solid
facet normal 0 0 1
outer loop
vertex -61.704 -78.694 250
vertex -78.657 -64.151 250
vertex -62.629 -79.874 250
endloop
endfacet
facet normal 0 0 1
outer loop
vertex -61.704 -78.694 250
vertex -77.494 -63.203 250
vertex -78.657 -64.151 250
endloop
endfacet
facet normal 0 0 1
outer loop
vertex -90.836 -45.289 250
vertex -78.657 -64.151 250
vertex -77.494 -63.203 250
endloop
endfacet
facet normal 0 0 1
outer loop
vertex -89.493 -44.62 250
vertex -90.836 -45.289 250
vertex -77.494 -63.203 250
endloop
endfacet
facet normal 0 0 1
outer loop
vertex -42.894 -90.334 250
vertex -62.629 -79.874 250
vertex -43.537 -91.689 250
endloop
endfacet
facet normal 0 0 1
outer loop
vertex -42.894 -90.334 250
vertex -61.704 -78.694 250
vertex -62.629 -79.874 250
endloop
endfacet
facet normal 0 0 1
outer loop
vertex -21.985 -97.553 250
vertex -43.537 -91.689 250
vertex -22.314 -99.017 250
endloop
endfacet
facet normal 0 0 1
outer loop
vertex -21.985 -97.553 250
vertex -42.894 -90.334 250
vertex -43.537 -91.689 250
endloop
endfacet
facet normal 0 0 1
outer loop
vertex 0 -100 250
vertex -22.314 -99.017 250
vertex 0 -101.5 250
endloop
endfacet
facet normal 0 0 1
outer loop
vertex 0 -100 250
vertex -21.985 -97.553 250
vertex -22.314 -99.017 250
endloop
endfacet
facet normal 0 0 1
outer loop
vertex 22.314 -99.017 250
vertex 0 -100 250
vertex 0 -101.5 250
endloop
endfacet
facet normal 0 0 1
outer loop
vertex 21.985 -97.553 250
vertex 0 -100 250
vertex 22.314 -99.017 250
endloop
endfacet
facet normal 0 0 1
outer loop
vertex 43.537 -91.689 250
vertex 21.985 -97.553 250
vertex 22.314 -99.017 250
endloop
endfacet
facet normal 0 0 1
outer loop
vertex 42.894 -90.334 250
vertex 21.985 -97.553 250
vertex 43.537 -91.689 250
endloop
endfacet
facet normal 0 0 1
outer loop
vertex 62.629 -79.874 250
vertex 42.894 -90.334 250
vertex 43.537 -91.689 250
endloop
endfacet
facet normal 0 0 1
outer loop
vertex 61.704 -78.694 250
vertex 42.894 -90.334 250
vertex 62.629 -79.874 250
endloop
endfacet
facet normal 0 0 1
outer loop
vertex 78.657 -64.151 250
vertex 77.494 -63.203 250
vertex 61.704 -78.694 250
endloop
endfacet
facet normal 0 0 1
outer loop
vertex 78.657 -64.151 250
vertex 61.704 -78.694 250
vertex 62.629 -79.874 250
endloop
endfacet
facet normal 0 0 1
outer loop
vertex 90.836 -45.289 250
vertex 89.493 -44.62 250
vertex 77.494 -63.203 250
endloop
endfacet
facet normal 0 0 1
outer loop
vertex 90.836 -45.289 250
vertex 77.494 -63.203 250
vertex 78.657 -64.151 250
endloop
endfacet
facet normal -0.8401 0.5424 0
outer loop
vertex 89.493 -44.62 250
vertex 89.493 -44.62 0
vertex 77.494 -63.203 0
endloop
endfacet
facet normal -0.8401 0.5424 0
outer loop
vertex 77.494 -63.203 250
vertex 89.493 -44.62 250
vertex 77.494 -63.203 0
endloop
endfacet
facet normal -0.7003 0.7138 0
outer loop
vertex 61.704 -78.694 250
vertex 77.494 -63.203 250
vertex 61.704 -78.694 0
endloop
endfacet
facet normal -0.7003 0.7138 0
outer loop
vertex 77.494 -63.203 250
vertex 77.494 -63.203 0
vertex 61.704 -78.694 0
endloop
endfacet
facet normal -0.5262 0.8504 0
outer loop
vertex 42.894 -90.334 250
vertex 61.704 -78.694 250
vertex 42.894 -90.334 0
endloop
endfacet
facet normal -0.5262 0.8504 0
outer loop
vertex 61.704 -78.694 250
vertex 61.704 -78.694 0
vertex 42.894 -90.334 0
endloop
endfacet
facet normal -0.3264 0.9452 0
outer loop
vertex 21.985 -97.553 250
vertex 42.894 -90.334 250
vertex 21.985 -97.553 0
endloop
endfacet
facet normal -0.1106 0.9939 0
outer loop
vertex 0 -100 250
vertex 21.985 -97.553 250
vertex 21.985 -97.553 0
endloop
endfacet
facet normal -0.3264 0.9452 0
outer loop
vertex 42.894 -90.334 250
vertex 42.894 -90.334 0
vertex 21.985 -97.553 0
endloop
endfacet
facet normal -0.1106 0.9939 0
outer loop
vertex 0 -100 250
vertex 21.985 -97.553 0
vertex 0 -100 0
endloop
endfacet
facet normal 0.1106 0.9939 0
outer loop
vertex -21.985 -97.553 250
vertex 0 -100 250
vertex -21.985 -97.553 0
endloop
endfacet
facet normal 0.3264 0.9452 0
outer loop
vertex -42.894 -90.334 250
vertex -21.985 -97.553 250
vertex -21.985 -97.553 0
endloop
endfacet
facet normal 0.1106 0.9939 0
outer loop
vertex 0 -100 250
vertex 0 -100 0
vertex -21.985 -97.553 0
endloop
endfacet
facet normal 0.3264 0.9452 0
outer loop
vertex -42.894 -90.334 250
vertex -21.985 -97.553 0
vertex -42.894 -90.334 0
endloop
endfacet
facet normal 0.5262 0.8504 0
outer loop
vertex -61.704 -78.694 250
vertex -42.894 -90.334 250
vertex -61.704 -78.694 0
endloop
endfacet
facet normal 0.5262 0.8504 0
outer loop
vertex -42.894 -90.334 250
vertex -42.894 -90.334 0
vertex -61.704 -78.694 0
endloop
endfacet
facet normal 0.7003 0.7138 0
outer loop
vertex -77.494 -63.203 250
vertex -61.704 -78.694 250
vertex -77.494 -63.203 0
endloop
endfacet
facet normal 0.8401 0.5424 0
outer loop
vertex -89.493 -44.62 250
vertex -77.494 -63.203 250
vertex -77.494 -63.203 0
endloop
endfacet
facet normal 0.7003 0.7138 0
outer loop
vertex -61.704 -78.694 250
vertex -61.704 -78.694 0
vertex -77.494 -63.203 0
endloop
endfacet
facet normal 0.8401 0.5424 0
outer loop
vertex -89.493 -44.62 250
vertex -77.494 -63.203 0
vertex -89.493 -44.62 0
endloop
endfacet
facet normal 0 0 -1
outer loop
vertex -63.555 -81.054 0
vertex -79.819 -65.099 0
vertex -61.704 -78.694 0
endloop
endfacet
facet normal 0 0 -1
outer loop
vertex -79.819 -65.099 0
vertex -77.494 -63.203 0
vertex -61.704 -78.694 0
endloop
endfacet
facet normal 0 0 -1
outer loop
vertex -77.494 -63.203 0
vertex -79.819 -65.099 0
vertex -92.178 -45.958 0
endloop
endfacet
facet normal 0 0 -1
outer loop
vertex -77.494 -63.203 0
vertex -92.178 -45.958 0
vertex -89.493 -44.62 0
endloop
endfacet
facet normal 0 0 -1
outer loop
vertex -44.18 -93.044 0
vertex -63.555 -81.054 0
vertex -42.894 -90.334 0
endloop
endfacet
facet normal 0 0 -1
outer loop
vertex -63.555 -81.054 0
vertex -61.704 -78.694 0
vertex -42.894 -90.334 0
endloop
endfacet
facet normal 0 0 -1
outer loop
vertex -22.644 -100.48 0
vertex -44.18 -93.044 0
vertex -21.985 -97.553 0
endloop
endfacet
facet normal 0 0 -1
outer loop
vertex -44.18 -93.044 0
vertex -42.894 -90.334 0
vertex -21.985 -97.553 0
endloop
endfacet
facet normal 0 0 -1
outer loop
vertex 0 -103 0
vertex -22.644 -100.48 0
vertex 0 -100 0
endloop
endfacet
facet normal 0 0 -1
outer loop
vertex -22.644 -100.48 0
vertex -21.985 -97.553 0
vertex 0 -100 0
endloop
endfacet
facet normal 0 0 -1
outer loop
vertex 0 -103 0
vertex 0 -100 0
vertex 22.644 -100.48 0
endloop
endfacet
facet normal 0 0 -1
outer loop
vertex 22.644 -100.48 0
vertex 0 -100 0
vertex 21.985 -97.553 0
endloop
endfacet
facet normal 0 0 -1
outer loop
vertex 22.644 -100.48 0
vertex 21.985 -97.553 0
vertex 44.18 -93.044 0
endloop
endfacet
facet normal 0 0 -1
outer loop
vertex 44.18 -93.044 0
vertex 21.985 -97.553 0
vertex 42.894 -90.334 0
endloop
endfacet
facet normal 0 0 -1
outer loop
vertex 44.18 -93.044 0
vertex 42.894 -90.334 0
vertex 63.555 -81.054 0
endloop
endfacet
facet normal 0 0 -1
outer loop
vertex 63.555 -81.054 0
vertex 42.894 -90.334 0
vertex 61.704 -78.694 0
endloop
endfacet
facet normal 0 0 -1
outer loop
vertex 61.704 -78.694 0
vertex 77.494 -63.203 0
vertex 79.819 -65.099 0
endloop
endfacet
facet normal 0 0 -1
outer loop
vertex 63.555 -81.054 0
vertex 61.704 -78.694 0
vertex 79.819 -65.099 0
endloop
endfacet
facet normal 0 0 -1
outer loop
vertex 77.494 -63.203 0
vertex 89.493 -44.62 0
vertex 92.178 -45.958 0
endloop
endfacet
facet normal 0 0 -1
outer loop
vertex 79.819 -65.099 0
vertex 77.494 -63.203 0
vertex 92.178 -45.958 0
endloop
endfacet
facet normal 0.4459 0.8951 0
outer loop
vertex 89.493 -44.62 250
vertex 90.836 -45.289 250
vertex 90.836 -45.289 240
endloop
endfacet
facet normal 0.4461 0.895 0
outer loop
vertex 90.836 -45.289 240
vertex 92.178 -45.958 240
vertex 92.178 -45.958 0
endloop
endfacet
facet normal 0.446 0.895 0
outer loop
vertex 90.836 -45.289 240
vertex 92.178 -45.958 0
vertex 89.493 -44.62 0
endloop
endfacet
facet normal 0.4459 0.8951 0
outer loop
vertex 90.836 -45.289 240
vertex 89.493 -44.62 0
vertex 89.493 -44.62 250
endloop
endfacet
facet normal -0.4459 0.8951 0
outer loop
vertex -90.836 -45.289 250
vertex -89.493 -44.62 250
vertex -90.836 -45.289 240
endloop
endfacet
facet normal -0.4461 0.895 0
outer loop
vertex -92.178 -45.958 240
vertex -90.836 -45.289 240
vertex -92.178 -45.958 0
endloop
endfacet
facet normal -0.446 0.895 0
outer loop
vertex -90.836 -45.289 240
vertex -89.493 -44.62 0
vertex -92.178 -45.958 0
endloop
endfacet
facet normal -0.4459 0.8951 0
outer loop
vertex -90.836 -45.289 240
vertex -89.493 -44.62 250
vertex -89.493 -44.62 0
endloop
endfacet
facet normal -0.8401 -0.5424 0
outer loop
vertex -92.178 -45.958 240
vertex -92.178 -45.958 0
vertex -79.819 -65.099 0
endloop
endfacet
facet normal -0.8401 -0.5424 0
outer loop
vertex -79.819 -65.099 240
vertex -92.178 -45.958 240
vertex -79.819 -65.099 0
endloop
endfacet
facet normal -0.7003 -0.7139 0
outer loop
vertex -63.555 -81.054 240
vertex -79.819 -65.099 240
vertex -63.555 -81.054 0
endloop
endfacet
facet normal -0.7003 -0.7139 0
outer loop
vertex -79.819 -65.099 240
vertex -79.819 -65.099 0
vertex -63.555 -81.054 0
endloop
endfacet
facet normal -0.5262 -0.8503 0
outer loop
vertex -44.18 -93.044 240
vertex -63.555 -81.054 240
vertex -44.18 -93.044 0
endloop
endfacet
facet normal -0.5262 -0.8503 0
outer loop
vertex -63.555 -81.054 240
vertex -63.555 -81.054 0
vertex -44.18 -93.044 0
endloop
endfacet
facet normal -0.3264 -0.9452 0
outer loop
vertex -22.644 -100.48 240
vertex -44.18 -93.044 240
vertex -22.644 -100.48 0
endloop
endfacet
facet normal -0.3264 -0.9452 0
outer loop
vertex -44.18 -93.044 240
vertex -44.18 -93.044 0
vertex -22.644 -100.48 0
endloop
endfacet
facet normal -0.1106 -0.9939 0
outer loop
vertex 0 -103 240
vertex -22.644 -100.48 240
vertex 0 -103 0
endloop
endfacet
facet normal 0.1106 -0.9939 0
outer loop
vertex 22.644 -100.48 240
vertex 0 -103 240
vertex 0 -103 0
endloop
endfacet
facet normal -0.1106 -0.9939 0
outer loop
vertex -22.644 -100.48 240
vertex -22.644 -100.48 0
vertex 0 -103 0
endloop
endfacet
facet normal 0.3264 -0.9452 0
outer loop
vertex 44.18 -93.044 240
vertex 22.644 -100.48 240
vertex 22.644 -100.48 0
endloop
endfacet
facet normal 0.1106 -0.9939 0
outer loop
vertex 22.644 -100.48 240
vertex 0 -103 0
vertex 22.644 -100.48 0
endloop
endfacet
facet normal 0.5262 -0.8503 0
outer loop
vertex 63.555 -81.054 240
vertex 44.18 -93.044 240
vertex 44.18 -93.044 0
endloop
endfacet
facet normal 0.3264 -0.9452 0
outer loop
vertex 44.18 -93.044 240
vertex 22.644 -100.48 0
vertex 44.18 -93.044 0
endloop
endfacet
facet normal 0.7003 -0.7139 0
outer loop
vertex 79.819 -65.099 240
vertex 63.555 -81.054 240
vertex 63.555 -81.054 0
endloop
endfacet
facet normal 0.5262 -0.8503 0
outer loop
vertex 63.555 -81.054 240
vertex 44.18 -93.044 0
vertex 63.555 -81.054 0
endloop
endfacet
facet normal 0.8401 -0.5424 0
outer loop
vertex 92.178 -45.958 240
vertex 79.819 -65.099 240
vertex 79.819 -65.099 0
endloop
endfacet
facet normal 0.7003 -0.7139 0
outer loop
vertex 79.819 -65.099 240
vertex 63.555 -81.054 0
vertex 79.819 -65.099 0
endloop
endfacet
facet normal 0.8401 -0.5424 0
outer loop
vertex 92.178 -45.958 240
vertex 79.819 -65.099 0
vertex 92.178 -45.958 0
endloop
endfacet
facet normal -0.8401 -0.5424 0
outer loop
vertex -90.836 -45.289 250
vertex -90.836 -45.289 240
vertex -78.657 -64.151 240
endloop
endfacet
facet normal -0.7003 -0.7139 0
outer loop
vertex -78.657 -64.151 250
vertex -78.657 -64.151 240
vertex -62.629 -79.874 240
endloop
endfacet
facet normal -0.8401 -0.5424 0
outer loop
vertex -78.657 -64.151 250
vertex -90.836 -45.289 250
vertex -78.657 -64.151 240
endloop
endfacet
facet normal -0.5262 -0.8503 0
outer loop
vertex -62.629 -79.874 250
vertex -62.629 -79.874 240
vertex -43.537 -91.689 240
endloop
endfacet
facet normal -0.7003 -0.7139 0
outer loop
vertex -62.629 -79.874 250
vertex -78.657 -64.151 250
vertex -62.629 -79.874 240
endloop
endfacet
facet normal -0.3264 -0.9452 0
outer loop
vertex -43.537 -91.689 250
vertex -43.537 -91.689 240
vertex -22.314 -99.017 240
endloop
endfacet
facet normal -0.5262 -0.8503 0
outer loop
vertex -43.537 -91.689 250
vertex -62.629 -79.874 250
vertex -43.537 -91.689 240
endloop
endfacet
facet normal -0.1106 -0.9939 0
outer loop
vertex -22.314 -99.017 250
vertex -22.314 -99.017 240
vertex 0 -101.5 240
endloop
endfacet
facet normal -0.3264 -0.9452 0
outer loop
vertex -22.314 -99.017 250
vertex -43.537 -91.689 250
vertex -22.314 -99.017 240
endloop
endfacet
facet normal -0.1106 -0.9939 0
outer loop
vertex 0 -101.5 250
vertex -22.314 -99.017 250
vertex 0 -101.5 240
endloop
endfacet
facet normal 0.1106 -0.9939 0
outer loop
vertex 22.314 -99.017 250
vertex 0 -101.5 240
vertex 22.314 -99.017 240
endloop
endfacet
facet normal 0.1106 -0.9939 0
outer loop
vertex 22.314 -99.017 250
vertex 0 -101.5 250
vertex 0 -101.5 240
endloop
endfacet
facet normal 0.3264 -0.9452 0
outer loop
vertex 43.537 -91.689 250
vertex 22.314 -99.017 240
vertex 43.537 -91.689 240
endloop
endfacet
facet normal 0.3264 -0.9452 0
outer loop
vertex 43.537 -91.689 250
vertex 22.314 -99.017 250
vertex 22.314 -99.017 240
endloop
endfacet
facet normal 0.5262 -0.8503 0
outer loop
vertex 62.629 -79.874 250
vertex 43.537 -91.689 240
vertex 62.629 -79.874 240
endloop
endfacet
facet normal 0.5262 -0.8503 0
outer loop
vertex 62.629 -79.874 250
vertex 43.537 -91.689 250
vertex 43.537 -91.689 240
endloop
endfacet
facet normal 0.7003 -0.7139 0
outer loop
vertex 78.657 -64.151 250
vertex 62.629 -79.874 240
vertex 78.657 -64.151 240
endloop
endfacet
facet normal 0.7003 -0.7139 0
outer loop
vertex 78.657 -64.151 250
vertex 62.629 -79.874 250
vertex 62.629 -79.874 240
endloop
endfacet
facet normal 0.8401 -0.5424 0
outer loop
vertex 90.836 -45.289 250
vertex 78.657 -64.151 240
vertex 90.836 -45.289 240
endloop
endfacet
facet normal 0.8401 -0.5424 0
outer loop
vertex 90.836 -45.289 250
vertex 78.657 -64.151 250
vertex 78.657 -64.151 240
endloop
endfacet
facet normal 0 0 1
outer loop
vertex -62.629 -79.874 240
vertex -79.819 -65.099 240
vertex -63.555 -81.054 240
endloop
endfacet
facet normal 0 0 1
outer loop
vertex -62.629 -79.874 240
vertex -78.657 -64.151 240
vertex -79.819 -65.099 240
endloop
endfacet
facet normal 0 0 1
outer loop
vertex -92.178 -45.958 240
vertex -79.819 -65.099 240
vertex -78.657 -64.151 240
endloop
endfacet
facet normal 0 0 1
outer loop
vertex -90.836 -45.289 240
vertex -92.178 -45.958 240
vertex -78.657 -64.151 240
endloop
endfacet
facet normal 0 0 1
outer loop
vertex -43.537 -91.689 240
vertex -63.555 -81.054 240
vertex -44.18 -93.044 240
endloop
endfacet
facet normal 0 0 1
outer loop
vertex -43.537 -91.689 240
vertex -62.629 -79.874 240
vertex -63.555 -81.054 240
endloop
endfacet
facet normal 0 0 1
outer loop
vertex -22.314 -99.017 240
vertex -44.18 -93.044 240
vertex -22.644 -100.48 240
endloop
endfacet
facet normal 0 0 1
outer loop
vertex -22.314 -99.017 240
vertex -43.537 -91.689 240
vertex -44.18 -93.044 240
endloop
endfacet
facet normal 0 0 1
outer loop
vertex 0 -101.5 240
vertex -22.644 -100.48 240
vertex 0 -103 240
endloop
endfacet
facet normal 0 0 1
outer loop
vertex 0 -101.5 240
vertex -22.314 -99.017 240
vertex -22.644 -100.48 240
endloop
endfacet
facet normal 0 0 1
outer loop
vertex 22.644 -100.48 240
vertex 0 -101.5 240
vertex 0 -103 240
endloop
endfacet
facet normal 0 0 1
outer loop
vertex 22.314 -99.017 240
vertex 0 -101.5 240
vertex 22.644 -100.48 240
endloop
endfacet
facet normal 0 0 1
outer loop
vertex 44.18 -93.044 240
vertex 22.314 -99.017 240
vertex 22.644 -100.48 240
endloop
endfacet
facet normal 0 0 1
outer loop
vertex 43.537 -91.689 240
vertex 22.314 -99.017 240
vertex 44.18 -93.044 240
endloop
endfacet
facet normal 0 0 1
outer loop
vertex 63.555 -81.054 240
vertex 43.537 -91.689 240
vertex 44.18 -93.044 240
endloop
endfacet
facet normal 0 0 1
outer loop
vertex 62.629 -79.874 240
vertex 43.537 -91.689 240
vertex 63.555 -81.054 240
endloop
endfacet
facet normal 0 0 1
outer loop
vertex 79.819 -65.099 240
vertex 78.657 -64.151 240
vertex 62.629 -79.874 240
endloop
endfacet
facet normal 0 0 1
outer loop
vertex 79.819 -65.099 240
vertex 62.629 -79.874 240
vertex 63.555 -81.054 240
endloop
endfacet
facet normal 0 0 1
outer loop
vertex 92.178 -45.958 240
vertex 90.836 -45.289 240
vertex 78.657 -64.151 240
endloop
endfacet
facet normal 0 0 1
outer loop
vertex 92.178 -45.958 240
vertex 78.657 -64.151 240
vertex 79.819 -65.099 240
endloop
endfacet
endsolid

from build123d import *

# Parameters (mm, degrees)
F1_DEPTH = 250
F2_R     = 103
F2_R_2   = 101.5
F3_DEPTH = 10


with BuildPart() as f1:
    # F0 (on Top) → F1 (new body)
    with BuildSketch(Plane.XY):
        with BuildLine():
            Line((-89.493436, -44.619781), (-92.178239, -45.958375))
            ThreePointArc((-92.178239, -45.958375), (0, -103), (92.178239, -45.958375))
            Line((92.178239, -45.958375), (89.493436, -44.619781))
            ThreePointArc((89.493436, -44.619781), (0, -100), (-89.493436, -44.619781))
        make_face()
    extrude(amount=F1_DEPTH)

    # F2 (on face) → F3 (cut)
    with BuildSketch(Plane.XY.offset(250)):
        Circle(F2_R)
        Circle(F2_R_2, mode=Mode.SUBTRACT)
    extrude(amount=-F3_DEPTH, mode=Mode.SUBTRACT)


solid = f1.part
